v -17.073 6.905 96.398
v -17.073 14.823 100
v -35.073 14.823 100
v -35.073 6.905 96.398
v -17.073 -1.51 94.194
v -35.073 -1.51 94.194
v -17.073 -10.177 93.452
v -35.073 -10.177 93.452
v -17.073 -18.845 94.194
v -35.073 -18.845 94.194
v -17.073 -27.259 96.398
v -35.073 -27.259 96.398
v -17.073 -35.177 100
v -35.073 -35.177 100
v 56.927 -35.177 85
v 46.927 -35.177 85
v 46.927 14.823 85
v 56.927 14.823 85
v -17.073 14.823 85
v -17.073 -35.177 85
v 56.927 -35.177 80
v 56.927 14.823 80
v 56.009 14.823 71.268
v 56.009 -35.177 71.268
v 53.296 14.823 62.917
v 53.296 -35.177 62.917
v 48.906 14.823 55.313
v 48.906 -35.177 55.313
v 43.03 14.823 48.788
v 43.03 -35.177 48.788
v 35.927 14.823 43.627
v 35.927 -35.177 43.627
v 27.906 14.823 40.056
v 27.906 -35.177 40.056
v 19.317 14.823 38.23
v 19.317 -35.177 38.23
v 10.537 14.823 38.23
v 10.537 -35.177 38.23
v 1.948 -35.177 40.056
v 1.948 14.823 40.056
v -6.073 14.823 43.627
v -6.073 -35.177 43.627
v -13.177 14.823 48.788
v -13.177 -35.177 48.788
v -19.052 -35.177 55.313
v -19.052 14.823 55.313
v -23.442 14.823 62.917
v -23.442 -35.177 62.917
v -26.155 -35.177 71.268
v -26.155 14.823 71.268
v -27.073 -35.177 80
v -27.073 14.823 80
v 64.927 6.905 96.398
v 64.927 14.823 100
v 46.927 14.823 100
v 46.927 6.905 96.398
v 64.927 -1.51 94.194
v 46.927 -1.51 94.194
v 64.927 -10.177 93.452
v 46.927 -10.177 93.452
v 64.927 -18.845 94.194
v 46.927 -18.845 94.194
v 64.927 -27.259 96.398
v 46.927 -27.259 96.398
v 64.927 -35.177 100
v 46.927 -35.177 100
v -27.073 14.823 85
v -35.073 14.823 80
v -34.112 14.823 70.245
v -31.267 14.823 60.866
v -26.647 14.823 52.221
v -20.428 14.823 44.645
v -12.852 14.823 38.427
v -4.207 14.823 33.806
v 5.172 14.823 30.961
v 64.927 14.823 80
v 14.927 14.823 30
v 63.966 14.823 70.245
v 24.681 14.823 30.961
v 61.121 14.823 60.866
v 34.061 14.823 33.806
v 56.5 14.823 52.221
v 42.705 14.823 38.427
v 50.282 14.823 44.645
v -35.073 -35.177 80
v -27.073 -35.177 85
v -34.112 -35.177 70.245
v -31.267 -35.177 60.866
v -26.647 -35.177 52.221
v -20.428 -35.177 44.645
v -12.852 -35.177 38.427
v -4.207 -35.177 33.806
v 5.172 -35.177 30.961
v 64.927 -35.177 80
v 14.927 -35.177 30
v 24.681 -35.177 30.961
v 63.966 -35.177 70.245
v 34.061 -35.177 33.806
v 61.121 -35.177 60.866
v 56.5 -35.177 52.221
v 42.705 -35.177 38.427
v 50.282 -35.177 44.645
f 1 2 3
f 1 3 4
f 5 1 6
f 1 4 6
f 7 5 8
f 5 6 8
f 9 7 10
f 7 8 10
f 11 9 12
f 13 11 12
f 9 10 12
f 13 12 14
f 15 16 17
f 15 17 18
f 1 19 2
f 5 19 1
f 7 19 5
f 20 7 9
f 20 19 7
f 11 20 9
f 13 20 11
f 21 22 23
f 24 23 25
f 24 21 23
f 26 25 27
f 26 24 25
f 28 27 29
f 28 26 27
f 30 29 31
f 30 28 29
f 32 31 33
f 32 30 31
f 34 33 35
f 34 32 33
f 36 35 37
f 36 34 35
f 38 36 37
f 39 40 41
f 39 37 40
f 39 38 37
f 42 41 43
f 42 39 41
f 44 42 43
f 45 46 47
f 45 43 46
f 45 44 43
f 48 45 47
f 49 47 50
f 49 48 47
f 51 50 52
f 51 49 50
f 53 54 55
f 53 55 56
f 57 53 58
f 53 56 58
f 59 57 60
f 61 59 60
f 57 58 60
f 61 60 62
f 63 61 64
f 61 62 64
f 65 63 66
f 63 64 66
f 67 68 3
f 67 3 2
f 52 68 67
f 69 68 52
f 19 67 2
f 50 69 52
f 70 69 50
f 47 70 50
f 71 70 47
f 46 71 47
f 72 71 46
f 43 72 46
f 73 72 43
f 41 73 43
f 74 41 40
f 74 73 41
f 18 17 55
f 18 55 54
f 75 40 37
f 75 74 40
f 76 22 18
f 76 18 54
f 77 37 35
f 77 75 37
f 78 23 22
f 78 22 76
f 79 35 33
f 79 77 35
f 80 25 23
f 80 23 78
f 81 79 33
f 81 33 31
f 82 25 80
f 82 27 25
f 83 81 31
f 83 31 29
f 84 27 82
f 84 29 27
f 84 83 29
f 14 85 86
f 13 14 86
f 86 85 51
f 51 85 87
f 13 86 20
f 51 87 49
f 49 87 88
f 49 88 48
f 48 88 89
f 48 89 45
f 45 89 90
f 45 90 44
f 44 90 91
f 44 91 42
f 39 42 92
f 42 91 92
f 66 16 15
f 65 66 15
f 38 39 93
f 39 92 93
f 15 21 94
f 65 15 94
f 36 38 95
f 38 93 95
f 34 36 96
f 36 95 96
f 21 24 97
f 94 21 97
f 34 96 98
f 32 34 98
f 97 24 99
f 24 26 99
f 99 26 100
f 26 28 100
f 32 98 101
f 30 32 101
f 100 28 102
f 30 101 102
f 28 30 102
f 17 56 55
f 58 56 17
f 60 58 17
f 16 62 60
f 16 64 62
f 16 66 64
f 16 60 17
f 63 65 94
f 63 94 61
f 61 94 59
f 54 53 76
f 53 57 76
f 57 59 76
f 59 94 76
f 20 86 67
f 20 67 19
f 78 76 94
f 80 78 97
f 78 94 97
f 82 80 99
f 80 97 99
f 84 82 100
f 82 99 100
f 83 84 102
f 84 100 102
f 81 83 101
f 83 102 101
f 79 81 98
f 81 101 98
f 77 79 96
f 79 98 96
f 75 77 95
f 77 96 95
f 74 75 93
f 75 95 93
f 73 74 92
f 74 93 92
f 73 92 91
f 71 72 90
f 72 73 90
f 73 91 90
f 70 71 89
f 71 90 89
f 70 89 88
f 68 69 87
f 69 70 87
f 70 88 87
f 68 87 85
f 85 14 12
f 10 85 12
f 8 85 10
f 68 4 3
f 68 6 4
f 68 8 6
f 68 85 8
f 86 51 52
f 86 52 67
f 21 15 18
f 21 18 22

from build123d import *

# Parameters (mm, degrees)
SKETCH1_W           = 100
SKETCH1_H           = 50
BOSS_EXTRUDE1_DEPTH = 100
SKETCH2_R           = 51
CUT_EXTRUDE1_DEPTH  = 100
CUT_EXTRUDE2_DEPTH  = 100


with BuildPart() as part:
    # Sketch1 → Boss-Extrude1 (new body)
    with BuildSketch(Plane.XY):
        with Locations((14.926931106, -10.177453027)):
            Rectangle(SKETCH1_W, SKETCH1_H)
    extrude(amount=BOSS_EXTRUDE1_DEPTH)

    # Sketch2 → Cut-Extrude1 (cut)
    with BuildSketch(Plane.ZY.offset(35.073068894)):
        with Locations((144.452221542, -10.177453027)):
            Circle(SKETCH2_R)
    extrude(amount=-CUT_EXTRUDE1_DEPTH, mode=Mode.SUBTRACT)

    # Sketch3 → Cut-Extrude2 (cut)
    with BuildSketch(Plane.XZ.offset(35.177453027)):
        with BuildLine():
            Line((-35.073068894, 80), (-35.073068894, 0))
            Line((-35.073068894, 0), (64.926931106, 0))
            Line((64.926931106, 0), (64.926931106, 80))
            ThreePointArc((64.926931106, 80), (14.926931106, 30), (-35.073068894, 80))
        make_face()
        with BuildLine():
            Line((-27.073068894, 85), (-17.073068894, 85))
            Line((-17.073068894, 85), (-17.073068894, 100))
            Line((-17.073068894, 100), (46.926931106, 100))
            Line((46.926931106, 100), (46.926931106, 85))
            Line((46.926931106, 85), (56.926931106, 85))
            Line((56.926931106, 85), (56.926931106, 80))
            ThreePointArc((56.926931106, 80), (14.926931106, 38), (-27.073068894, 80))
            Line((-27.073068894, 80), (-27.073068894, 85))
        make_face()
    extrude(amount=-CUT_EXTRUDE2_DEPTH, mode=Mode.SUBTRACT)


solid = part.part
